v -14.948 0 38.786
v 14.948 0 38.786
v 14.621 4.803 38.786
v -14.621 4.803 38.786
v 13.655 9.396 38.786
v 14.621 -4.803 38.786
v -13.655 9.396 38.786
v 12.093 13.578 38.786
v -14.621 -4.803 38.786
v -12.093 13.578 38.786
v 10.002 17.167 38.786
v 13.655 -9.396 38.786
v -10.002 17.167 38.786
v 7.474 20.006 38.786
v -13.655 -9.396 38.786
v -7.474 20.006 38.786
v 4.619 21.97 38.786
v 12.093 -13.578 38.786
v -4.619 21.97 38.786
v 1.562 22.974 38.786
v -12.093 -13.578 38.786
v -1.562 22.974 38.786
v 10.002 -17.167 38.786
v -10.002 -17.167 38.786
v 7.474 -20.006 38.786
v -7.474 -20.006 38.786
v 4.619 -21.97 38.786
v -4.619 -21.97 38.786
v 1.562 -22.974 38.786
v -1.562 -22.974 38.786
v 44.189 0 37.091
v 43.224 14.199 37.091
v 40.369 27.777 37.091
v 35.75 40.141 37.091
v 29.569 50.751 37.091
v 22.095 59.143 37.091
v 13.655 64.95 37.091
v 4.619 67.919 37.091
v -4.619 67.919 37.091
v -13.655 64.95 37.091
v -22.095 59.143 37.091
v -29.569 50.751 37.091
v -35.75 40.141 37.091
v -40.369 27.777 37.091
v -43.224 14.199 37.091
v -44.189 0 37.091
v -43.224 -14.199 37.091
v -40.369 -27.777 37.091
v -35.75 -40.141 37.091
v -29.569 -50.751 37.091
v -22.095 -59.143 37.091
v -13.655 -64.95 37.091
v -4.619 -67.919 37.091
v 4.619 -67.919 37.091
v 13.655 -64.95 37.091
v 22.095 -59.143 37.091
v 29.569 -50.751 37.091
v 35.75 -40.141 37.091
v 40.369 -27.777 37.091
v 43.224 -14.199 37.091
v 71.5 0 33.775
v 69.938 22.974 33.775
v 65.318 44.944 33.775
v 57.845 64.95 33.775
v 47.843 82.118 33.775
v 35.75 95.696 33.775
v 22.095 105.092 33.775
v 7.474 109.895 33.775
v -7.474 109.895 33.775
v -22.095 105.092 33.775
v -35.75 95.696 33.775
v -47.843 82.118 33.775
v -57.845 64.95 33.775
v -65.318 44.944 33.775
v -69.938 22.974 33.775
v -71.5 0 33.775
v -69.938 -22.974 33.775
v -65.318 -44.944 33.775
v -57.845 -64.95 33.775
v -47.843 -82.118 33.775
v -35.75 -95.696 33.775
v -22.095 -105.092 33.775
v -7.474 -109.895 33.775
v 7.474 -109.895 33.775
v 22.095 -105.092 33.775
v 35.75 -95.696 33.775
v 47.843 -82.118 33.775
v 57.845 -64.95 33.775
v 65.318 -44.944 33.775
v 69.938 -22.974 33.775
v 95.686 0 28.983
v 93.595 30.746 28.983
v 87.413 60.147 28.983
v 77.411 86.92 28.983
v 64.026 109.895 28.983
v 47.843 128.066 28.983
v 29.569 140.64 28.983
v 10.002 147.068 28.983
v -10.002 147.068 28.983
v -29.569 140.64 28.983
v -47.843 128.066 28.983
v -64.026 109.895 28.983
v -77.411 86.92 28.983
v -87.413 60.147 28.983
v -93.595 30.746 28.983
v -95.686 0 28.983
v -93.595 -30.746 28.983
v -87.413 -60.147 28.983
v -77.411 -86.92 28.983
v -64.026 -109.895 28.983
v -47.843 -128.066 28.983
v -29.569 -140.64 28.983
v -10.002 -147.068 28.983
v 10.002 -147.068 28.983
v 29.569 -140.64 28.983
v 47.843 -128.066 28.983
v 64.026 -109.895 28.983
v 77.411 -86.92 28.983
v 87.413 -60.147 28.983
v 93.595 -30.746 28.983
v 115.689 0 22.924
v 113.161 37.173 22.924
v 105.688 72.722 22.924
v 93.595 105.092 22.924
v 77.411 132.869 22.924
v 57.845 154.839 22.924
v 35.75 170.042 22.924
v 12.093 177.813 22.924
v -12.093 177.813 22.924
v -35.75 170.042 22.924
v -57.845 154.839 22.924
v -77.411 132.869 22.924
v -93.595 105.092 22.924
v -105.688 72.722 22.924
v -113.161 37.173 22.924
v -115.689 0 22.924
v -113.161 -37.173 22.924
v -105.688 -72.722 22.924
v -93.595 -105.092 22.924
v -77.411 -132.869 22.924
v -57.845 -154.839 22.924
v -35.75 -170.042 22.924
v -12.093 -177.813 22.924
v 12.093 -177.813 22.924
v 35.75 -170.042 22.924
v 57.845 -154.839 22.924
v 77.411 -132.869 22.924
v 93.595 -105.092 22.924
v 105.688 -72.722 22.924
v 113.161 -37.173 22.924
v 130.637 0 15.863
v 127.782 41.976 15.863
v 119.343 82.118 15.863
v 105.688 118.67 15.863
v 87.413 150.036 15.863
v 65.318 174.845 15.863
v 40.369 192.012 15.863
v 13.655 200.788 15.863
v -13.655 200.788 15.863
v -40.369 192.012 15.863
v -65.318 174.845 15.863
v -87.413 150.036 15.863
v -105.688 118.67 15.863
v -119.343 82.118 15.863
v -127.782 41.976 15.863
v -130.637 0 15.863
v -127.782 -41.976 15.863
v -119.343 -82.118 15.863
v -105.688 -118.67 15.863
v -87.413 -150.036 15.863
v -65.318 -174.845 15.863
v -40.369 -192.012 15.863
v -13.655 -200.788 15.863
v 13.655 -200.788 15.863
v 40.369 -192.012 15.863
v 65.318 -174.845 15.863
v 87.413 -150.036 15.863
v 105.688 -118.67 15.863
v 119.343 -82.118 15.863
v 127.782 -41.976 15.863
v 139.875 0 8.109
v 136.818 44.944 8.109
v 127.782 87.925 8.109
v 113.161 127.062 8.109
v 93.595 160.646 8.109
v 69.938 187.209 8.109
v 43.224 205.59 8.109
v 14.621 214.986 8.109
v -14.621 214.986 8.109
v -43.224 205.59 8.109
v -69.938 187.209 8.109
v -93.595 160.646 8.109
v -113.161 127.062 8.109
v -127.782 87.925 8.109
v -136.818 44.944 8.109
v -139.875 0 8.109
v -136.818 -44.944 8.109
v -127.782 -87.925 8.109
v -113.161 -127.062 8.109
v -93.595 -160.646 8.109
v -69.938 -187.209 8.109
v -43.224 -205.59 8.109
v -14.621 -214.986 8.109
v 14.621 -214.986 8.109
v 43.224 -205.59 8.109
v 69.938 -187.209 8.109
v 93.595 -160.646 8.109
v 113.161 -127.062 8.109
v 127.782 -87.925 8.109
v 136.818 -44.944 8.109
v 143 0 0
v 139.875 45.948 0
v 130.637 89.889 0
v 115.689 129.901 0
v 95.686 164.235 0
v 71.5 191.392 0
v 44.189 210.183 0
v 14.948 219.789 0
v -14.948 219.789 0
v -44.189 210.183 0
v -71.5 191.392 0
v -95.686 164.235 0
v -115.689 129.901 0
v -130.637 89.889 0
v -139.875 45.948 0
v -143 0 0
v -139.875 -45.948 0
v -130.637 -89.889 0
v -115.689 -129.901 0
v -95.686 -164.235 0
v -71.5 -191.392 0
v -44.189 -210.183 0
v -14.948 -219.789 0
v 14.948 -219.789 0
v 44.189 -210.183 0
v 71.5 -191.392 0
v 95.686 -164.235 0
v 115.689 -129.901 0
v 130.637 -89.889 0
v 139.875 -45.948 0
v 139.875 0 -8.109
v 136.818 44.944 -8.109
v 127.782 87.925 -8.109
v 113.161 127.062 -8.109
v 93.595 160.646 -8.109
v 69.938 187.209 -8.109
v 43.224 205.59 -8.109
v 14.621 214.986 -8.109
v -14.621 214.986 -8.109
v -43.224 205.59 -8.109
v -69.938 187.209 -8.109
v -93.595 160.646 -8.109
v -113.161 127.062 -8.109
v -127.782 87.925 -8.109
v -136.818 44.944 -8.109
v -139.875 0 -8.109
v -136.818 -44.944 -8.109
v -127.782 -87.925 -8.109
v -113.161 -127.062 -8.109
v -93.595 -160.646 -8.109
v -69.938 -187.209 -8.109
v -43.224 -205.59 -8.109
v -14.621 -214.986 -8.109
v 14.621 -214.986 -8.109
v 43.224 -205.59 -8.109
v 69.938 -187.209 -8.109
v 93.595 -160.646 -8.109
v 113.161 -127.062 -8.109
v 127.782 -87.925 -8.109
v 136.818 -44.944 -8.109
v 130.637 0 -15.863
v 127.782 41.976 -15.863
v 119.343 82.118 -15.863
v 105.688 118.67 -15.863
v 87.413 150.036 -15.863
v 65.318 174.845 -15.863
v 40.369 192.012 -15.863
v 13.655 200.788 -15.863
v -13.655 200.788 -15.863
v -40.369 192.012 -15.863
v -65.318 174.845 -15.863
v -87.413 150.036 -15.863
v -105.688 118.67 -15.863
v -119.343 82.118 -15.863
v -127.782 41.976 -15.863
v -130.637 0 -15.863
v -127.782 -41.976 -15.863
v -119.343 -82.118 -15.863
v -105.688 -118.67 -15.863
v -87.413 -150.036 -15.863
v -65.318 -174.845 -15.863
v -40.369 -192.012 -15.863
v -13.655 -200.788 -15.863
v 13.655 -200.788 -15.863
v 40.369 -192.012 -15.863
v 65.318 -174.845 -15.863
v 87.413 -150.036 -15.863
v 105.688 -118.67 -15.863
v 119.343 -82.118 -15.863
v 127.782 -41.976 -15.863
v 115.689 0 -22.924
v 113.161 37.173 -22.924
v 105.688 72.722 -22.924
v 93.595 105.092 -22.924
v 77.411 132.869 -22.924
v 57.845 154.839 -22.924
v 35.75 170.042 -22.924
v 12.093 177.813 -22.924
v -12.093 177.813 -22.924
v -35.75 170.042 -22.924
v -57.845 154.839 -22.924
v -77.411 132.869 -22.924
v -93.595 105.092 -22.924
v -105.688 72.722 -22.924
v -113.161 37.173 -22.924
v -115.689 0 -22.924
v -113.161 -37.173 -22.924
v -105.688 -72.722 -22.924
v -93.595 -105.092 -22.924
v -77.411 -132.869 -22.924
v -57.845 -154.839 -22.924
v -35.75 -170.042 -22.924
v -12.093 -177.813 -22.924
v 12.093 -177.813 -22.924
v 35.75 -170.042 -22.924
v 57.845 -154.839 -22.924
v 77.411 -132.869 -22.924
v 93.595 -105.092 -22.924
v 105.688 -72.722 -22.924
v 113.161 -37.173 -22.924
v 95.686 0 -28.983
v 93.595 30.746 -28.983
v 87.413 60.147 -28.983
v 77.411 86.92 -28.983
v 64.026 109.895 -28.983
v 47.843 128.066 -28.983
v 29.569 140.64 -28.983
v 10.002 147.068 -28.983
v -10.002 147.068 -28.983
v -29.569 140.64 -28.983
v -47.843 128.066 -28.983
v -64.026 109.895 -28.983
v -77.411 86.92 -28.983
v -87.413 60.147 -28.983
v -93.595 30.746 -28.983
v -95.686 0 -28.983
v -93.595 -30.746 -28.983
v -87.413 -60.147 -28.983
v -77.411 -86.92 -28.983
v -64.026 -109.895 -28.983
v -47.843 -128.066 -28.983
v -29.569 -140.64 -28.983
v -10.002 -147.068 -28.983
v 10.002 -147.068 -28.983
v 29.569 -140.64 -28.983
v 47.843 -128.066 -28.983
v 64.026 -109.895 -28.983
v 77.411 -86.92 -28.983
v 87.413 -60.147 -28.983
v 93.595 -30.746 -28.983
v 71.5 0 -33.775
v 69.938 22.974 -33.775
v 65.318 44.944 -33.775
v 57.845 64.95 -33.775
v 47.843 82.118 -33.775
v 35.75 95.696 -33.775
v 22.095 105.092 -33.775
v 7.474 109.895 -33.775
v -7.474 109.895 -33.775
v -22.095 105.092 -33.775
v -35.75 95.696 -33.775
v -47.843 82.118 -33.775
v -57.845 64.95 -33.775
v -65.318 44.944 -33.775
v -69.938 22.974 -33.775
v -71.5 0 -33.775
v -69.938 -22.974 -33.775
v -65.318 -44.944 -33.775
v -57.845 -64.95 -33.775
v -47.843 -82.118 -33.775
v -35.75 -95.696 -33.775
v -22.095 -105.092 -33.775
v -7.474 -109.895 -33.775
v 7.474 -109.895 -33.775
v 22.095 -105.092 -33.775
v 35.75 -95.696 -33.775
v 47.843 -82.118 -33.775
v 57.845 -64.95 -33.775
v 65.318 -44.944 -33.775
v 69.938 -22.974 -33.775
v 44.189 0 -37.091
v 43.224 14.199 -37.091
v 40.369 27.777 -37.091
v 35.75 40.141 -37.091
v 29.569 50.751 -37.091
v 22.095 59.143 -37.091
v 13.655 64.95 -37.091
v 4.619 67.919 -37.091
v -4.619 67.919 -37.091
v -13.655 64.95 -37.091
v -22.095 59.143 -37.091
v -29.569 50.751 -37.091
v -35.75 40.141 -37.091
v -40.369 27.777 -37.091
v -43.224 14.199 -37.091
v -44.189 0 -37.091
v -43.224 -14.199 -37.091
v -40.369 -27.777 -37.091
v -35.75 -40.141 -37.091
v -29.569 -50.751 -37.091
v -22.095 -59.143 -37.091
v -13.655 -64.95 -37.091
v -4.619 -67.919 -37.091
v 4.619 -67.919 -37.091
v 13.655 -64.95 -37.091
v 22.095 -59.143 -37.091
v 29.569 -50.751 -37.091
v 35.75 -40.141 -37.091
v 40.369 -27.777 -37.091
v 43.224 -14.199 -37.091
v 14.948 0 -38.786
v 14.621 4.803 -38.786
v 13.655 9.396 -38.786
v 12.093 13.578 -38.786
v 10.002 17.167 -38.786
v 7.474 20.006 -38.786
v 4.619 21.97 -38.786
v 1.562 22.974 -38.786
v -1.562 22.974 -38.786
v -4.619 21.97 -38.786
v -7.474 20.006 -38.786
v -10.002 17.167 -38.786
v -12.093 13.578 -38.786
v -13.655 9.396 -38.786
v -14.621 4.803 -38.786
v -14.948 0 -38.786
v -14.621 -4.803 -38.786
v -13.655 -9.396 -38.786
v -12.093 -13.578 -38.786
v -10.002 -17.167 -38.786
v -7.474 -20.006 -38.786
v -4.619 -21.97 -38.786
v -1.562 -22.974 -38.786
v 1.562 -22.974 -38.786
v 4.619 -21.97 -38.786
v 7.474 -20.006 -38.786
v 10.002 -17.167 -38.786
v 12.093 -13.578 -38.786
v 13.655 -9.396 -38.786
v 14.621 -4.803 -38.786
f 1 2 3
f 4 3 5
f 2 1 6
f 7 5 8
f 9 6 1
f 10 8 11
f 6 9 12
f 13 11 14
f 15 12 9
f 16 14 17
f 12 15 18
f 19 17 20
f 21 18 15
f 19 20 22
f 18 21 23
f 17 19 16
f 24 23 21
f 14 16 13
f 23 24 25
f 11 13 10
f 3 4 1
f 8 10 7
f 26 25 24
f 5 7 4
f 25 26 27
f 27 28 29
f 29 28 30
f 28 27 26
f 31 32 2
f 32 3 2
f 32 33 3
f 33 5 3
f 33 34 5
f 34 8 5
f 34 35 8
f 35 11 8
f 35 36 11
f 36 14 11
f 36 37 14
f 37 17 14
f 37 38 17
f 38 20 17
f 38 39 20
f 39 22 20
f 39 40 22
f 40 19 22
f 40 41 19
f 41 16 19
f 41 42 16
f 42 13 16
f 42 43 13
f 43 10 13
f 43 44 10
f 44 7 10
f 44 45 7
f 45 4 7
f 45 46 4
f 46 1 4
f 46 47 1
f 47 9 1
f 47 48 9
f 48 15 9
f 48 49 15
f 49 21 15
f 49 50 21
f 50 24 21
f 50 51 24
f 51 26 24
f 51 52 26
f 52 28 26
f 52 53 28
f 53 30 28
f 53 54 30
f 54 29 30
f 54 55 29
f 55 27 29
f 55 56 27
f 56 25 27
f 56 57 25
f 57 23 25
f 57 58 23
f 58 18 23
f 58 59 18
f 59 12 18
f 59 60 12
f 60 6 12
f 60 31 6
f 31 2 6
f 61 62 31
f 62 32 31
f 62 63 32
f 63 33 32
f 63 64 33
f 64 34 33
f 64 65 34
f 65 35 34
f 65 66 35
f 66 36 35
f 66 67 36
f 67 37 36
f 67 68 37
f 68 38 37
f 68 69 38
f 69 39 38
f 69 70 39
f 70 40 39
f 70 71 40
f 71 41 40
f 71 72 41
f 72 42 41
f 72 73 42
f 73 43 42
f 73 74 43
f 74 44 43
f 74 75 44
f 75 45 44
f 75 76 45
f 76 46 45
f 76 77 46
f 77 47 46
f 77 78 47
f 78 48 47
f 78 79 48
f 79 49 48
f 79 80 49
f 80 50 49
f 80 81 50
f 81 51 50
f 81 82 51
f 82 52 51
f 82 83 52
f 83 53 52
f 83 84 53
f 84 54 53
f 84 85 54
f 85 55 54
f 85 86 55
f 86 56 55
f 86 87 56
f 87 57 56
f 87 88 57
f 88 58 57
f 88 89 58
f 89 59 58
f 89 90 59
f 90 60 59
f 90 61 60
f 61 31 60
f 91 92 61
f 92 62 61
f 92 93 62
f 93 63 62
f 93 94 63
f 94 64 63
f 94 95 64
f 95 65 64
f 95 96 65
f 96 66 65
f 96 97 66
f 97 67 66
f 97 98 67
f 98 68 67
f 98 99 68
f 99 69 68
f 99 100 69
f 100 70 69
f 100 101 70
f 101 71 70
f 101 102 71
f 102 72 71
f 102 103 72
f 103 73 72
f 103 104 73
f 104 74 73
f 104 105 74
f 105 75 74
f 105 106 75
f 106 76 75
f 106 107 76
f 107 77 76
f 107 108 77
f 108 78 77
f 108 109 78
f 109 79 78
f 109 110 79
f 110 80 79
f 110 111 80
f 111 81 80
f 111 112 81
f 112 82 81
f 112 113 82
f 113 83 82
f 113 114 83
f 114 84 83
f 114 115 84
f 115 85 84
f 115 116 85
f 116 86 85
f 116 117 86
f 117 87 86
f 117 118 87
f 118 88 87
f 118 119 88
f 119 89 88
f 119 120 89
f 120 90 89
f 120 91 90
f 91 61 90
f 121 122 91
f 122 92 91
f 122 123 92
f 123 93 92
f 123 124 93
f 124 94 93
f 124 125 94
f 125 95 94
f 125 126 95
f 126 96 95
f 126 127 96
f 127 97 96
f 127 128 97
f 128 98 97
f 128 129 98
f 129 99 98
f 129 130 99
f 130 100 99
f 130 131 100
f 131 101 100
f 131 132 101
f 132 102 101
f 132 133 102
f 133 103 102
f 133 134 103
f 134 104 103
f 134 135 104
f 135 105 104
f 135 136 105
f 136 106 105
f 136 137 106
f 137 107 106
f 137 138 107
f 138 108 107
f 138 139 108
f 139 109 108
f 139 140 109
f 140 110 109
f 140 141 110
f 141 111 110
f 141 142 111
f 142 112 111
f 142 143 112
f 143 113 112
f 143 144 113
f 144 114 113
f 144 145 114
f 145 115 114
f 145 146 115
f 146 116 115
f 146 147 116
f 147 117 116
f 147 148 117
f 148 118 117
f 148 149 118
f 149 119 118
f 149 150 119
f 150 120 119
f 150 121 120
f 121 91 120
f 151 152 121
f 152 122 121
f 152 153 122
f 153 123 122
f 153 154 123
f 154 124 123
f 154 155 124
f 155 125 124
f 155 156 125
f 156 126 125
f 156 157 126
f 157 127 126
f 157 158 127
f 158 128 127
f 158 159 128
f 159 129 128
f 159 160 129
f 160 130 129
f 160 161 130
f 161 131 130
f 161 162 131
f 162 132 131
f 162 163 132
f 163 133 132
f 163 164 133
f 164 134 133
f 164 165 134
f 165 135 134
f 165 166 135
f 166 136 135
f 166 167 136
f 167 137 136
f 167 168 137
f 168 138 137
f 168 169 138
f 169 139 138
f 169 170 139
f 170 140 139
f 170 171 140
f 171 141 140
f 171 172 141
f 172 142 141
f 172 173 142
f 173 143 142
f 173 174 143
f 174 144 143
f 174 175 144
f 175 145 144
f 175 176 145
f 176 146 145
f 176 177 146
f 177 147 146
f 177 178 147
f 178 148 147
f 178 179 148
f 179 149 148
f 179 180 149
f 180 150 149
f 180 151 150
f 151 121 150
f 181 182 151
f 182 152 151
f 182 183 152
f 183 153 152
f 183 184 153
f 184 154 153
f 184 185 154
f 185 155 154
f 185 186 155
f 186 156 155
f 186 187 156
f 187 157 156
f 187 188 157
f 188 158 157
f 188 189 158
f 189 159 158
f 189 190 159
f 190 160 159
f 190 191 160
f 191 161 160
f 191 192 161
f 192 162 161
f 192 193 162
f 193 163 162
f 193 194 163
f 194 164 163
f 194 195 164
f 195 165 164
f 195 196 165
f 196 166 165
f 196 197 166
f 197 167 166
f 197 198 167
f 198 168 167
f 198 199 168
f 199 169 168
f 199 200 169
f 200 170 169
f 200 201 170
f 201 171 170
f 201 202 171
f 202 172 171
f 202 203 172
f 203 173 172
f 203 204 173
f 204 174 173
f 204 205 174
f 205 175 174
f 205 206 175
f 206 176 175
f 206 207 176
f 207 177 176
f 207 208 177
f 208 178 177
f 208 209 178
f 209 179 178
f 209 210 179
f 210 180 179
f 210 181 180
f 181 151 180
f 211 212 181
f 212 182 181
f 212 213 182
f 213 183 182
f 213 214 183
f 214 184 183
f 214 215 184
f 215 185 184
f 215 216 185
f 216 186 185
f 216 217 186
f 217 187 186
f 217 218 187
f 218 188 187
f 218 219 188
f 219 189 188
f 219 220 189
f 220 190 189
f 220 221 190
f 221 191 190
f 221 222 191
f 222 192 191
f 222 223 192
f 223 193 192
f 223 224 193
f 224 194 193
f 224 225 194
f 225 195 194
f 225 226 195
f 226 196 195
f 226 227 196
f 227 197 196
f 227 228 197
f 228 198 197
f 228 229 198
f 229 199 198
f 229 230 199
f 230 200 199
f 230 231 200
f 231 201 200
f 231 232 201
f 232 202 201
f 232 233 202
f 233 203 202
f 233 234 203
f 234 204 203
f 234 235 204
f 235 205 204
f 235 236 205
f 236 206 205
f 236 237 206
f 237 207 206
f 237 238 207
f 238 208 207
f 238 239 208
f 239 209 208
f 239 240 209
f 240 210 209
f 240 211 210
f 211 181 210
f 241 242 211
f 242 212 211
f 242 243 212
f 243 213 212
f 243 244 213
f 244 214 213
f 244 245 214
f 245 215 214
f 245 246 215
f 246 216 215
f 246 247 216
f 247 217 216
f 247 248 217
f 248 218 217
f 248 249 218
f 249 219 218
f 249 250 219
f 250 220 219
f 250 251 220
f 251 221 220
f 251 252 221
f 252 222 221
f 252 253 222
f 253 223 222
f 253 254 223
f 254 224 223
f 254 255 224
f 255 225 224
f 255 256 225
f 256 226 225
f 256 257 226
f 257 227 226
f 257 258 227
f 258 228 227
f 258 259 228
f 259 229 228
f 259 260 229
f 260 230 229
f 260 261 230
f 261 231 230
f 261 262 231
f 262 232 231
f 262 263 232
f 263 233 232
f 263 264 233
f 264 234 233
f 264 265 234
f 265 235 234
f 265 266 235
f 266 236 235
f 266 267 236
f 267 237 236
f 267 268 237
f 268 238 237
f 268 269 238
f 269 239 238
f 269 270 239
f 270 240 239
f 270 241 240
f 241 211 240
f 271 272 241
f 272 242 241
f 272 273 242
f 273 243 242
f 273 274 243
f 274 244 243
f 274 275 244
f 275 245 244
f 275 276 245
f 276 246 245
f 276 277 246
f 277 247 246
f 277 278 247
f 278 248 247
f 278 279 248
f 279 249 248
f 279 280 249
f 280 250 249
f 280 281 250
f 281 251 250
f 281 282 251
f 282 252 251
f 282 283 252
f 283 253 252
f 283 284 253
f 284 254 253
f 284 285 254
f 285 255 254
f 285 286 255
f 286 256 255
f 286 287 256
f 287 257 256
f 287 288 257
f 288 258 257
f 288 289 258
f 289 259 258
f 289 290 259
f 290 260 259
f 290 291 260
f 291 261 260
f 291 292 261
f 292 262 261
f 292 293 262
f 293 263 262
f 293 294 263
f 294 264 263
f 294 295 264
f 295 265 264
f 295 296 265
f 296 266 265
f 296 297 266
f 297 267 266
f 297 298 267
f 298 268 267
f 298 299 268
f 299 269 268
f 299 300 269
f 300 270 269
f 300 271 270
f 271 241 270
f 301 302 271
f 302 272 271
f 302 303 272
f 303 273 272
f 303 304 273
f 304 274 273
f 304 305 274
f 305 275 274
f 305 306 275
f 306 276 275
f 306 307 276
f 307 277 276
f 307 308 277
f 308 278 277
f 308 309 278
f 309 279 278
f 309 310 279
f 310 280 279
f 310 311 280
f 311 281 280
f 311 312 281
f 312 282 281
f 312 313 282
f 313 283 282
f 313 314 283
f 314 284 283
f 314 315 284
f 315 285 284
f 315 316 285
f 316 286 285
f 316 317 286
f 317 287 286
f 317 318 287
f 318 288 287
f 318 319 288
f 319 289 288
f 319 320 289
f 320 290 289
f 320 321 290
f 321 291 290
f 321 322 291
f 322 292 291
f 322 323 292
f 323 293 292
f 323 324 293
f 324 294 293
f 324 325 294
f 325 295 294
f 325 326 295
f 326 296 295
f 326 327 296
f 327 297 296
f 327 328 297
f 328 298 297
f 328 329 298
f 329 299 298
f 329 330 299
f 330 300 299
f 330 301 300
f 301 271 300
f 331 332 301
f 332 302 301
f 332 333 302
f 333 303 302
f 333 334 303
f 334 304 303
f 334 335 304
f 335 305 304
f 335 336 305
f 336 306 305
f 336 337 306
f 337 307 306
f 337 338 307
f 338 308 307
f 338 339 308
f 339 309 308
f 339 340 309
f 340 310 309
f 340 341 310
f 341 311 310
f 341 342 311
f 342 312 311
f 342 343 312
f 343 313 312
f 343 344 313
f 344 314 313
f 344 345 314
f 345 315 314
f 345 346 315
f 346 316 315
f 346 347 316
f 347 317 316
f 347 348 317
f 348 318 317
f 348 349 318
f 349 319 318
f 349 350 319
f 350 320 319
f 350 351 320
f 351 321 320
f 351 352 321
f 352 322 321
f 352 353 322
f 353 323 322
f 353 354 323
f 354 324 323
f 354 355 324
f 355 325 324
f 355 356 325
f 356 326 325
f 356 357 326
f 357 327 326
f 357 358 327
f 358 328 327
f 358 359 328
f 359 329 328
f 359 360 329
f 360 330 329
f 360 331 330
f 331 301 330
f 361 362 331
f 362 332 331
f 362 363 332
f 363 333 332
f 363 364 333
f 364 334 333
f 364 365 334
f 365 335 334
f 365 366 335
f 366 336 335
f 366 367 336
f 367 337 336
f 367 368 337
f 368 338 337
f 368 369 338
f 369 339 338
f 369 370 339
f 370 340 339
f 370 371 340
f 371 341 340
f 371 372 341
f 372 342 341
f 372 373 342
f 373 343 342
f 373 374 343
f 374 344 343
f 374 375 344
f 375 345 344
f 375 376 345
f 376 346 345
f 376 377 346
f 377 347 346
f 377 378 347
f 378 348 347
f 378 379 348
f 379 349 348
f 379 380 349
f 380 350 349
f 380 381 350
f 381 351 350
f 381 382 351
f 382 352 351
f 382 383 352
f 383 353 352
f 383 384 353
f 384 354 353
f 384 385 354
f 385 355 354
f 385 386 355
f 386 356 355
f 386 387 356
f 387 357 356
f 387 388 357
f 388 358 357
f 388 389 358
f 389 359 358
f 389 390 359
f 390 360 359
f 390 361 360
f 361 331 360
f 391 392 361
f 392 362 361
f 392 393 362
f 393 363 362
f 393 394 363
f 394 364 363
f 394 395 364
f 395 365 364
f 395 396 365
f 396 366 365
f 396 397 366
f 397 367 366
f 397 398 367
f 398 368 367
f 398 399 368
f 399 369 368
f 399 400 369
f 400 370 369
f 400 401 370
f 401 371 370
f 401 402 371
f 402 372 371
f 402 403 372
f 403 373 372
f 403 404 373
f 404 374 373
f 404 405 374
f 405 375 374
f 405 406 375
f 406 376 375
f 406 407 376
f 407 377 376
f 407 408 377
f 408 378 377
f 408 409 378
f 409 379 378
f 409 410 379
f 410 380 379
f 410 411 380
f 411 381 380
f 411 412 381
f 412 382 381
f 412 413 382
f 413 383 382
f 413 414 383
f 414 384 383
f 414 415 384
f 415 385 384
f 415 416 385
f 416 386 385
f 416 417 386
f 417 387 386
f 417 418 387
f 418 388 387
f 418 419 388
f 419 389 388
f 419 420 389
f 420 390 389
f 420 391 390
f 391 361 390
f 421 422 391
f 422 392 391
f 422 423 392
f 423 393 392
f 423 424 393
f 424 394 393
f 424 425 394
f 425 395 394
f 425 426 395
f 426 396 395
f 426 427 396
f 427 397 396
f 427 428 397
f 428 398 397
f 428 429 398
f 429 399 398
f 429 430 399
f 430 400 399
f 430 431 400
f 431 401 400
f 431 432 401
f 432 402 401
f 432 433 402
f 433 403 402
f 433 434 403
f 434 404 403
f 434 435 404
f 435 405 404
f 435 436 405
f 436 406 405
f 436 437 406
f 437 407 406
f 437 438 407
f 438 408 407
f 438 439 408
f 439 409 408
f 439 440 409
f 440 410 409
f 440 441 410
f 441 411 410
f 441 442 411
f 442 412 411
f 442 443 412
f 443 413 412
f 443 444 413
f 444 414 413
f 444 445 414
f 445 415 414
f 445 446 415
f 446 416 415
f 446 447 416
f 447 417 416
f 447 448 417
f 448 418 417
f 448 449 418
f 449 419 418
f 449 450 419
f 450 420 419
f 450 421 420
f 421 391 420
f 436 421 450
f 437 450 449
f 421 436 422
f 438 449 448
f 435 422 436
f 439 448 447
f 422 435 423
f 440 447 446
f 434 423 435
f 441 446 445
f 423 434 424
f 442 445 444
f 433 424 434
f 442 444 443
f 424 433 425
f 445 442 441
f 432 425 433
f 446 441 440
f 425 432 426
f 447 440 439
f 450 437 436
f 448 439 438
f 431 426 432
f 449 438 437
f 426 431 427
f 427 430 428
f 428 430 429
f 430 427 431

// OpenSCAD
// Generated by SolidPython 1.0.1 on 2020-07-29 00:46:50


scale(v = [11, 17, 3]) {
	sphere(r = 13);
}
/***********************************************
*********      SolidPython code:      **********
************************************************
 
# import packages: SolidPython
from solid import *
from solid.utils import *
from itertools import chain, combinations, permutations


class Resize:

    def __init__(self, scad_file):
        self.scad_file = scad_file
        #self.scad_file = import_scad(scad_file)
        # cone/cylinder param:
        self.r1 = 0
        self.r2 = 0
        self.h = 0
        # rectangular prism param:
        self.w = 0
        self.l = 0
        # ellipse param:
        self.r = 0

    # import OpenScad code (file name corresponds to shape)


    # classify shape + parameters
    def assign(self, param1, param2, param3):
        if self.scad_file == 'cone.scad':
            self.r1 = param1
            self.r2 = param2
            self.h = param3
        elif self.scad_file == 'cylinder.scad':
            self.r1 = param1
            self.r2 = param2
            self.h = param3
        elif self.scad_file == 'rectangularPrism.scad':
            self.h = param1
            self.l = param2
            self.w = param3
        else:
            self.r = param1
            self.h = param2

    # resize parameters
    def iterate(self):
        x = range(3, 20, 2)
        i = 1
        if self.scad_file == 'cone.scad':
            tempList = list(permutations(x, 2))
            for temp in tempList:
                param1 = temp[0]
                param2 = temp[1]
                filepath = 'produced_scad_files/' + 'cone' + str(param1) + '_' + str(param2) + '_' + '.scad'
                scad_render_to_file(cylinder(h=param1, r1=param2, r2=0), filepath)

        elif self.scad_file == 'cylinder.scad':
            tempList = list(permutations(x, 3))
            for temp in tempList:
                param1 = temp[0]
                param2 = temp[1]
                filepath = 'produced_scad_files/' + 'cylinder' + str(param1) + '_' + str(param2) + '_' + '.scad'
                scad_render_to_file(cylinder(h=param1, r1=param2, r2=param2), filepath)

        elif self.scad_file == 'rectangularPrism.scad':
            tempList = list(permutations(x, 3))
            for temp in tempList:
                param1 = temp[0]
                param2 = temp[1]
                param3 = temp[2]
                filepath = 'produced_scad_files/' + 'rectangularPrism' + str(param1) + '_' + str(param2) + '_' + str(
                    param3) + '.scad'
                scad_render_to_file(cube(size=(param1, param2, param3)), filepath)

        elif self.scad_file == 'ellipse.scad':
            tempList = list(permutations(x, 4))
            for temp in tempList:
                param1 = temp[0]
                param2 = temp[1]
                param3 = temp[2]
                param4 = temp[3]
                filepath = 'produced_scad_files/' + 'ellipse' + str(param1) + '_' + str(param2) + '_' + str(param3) + '_' + str(param4) + '.scad'
                scad_render_to_file(scale([param1, param2, param3])(sphere(r=param4)), filepath)

    def render_to_scadfile(self):
        scad_render_to_file(scad, 'example.scad') 
 
************************************************/
